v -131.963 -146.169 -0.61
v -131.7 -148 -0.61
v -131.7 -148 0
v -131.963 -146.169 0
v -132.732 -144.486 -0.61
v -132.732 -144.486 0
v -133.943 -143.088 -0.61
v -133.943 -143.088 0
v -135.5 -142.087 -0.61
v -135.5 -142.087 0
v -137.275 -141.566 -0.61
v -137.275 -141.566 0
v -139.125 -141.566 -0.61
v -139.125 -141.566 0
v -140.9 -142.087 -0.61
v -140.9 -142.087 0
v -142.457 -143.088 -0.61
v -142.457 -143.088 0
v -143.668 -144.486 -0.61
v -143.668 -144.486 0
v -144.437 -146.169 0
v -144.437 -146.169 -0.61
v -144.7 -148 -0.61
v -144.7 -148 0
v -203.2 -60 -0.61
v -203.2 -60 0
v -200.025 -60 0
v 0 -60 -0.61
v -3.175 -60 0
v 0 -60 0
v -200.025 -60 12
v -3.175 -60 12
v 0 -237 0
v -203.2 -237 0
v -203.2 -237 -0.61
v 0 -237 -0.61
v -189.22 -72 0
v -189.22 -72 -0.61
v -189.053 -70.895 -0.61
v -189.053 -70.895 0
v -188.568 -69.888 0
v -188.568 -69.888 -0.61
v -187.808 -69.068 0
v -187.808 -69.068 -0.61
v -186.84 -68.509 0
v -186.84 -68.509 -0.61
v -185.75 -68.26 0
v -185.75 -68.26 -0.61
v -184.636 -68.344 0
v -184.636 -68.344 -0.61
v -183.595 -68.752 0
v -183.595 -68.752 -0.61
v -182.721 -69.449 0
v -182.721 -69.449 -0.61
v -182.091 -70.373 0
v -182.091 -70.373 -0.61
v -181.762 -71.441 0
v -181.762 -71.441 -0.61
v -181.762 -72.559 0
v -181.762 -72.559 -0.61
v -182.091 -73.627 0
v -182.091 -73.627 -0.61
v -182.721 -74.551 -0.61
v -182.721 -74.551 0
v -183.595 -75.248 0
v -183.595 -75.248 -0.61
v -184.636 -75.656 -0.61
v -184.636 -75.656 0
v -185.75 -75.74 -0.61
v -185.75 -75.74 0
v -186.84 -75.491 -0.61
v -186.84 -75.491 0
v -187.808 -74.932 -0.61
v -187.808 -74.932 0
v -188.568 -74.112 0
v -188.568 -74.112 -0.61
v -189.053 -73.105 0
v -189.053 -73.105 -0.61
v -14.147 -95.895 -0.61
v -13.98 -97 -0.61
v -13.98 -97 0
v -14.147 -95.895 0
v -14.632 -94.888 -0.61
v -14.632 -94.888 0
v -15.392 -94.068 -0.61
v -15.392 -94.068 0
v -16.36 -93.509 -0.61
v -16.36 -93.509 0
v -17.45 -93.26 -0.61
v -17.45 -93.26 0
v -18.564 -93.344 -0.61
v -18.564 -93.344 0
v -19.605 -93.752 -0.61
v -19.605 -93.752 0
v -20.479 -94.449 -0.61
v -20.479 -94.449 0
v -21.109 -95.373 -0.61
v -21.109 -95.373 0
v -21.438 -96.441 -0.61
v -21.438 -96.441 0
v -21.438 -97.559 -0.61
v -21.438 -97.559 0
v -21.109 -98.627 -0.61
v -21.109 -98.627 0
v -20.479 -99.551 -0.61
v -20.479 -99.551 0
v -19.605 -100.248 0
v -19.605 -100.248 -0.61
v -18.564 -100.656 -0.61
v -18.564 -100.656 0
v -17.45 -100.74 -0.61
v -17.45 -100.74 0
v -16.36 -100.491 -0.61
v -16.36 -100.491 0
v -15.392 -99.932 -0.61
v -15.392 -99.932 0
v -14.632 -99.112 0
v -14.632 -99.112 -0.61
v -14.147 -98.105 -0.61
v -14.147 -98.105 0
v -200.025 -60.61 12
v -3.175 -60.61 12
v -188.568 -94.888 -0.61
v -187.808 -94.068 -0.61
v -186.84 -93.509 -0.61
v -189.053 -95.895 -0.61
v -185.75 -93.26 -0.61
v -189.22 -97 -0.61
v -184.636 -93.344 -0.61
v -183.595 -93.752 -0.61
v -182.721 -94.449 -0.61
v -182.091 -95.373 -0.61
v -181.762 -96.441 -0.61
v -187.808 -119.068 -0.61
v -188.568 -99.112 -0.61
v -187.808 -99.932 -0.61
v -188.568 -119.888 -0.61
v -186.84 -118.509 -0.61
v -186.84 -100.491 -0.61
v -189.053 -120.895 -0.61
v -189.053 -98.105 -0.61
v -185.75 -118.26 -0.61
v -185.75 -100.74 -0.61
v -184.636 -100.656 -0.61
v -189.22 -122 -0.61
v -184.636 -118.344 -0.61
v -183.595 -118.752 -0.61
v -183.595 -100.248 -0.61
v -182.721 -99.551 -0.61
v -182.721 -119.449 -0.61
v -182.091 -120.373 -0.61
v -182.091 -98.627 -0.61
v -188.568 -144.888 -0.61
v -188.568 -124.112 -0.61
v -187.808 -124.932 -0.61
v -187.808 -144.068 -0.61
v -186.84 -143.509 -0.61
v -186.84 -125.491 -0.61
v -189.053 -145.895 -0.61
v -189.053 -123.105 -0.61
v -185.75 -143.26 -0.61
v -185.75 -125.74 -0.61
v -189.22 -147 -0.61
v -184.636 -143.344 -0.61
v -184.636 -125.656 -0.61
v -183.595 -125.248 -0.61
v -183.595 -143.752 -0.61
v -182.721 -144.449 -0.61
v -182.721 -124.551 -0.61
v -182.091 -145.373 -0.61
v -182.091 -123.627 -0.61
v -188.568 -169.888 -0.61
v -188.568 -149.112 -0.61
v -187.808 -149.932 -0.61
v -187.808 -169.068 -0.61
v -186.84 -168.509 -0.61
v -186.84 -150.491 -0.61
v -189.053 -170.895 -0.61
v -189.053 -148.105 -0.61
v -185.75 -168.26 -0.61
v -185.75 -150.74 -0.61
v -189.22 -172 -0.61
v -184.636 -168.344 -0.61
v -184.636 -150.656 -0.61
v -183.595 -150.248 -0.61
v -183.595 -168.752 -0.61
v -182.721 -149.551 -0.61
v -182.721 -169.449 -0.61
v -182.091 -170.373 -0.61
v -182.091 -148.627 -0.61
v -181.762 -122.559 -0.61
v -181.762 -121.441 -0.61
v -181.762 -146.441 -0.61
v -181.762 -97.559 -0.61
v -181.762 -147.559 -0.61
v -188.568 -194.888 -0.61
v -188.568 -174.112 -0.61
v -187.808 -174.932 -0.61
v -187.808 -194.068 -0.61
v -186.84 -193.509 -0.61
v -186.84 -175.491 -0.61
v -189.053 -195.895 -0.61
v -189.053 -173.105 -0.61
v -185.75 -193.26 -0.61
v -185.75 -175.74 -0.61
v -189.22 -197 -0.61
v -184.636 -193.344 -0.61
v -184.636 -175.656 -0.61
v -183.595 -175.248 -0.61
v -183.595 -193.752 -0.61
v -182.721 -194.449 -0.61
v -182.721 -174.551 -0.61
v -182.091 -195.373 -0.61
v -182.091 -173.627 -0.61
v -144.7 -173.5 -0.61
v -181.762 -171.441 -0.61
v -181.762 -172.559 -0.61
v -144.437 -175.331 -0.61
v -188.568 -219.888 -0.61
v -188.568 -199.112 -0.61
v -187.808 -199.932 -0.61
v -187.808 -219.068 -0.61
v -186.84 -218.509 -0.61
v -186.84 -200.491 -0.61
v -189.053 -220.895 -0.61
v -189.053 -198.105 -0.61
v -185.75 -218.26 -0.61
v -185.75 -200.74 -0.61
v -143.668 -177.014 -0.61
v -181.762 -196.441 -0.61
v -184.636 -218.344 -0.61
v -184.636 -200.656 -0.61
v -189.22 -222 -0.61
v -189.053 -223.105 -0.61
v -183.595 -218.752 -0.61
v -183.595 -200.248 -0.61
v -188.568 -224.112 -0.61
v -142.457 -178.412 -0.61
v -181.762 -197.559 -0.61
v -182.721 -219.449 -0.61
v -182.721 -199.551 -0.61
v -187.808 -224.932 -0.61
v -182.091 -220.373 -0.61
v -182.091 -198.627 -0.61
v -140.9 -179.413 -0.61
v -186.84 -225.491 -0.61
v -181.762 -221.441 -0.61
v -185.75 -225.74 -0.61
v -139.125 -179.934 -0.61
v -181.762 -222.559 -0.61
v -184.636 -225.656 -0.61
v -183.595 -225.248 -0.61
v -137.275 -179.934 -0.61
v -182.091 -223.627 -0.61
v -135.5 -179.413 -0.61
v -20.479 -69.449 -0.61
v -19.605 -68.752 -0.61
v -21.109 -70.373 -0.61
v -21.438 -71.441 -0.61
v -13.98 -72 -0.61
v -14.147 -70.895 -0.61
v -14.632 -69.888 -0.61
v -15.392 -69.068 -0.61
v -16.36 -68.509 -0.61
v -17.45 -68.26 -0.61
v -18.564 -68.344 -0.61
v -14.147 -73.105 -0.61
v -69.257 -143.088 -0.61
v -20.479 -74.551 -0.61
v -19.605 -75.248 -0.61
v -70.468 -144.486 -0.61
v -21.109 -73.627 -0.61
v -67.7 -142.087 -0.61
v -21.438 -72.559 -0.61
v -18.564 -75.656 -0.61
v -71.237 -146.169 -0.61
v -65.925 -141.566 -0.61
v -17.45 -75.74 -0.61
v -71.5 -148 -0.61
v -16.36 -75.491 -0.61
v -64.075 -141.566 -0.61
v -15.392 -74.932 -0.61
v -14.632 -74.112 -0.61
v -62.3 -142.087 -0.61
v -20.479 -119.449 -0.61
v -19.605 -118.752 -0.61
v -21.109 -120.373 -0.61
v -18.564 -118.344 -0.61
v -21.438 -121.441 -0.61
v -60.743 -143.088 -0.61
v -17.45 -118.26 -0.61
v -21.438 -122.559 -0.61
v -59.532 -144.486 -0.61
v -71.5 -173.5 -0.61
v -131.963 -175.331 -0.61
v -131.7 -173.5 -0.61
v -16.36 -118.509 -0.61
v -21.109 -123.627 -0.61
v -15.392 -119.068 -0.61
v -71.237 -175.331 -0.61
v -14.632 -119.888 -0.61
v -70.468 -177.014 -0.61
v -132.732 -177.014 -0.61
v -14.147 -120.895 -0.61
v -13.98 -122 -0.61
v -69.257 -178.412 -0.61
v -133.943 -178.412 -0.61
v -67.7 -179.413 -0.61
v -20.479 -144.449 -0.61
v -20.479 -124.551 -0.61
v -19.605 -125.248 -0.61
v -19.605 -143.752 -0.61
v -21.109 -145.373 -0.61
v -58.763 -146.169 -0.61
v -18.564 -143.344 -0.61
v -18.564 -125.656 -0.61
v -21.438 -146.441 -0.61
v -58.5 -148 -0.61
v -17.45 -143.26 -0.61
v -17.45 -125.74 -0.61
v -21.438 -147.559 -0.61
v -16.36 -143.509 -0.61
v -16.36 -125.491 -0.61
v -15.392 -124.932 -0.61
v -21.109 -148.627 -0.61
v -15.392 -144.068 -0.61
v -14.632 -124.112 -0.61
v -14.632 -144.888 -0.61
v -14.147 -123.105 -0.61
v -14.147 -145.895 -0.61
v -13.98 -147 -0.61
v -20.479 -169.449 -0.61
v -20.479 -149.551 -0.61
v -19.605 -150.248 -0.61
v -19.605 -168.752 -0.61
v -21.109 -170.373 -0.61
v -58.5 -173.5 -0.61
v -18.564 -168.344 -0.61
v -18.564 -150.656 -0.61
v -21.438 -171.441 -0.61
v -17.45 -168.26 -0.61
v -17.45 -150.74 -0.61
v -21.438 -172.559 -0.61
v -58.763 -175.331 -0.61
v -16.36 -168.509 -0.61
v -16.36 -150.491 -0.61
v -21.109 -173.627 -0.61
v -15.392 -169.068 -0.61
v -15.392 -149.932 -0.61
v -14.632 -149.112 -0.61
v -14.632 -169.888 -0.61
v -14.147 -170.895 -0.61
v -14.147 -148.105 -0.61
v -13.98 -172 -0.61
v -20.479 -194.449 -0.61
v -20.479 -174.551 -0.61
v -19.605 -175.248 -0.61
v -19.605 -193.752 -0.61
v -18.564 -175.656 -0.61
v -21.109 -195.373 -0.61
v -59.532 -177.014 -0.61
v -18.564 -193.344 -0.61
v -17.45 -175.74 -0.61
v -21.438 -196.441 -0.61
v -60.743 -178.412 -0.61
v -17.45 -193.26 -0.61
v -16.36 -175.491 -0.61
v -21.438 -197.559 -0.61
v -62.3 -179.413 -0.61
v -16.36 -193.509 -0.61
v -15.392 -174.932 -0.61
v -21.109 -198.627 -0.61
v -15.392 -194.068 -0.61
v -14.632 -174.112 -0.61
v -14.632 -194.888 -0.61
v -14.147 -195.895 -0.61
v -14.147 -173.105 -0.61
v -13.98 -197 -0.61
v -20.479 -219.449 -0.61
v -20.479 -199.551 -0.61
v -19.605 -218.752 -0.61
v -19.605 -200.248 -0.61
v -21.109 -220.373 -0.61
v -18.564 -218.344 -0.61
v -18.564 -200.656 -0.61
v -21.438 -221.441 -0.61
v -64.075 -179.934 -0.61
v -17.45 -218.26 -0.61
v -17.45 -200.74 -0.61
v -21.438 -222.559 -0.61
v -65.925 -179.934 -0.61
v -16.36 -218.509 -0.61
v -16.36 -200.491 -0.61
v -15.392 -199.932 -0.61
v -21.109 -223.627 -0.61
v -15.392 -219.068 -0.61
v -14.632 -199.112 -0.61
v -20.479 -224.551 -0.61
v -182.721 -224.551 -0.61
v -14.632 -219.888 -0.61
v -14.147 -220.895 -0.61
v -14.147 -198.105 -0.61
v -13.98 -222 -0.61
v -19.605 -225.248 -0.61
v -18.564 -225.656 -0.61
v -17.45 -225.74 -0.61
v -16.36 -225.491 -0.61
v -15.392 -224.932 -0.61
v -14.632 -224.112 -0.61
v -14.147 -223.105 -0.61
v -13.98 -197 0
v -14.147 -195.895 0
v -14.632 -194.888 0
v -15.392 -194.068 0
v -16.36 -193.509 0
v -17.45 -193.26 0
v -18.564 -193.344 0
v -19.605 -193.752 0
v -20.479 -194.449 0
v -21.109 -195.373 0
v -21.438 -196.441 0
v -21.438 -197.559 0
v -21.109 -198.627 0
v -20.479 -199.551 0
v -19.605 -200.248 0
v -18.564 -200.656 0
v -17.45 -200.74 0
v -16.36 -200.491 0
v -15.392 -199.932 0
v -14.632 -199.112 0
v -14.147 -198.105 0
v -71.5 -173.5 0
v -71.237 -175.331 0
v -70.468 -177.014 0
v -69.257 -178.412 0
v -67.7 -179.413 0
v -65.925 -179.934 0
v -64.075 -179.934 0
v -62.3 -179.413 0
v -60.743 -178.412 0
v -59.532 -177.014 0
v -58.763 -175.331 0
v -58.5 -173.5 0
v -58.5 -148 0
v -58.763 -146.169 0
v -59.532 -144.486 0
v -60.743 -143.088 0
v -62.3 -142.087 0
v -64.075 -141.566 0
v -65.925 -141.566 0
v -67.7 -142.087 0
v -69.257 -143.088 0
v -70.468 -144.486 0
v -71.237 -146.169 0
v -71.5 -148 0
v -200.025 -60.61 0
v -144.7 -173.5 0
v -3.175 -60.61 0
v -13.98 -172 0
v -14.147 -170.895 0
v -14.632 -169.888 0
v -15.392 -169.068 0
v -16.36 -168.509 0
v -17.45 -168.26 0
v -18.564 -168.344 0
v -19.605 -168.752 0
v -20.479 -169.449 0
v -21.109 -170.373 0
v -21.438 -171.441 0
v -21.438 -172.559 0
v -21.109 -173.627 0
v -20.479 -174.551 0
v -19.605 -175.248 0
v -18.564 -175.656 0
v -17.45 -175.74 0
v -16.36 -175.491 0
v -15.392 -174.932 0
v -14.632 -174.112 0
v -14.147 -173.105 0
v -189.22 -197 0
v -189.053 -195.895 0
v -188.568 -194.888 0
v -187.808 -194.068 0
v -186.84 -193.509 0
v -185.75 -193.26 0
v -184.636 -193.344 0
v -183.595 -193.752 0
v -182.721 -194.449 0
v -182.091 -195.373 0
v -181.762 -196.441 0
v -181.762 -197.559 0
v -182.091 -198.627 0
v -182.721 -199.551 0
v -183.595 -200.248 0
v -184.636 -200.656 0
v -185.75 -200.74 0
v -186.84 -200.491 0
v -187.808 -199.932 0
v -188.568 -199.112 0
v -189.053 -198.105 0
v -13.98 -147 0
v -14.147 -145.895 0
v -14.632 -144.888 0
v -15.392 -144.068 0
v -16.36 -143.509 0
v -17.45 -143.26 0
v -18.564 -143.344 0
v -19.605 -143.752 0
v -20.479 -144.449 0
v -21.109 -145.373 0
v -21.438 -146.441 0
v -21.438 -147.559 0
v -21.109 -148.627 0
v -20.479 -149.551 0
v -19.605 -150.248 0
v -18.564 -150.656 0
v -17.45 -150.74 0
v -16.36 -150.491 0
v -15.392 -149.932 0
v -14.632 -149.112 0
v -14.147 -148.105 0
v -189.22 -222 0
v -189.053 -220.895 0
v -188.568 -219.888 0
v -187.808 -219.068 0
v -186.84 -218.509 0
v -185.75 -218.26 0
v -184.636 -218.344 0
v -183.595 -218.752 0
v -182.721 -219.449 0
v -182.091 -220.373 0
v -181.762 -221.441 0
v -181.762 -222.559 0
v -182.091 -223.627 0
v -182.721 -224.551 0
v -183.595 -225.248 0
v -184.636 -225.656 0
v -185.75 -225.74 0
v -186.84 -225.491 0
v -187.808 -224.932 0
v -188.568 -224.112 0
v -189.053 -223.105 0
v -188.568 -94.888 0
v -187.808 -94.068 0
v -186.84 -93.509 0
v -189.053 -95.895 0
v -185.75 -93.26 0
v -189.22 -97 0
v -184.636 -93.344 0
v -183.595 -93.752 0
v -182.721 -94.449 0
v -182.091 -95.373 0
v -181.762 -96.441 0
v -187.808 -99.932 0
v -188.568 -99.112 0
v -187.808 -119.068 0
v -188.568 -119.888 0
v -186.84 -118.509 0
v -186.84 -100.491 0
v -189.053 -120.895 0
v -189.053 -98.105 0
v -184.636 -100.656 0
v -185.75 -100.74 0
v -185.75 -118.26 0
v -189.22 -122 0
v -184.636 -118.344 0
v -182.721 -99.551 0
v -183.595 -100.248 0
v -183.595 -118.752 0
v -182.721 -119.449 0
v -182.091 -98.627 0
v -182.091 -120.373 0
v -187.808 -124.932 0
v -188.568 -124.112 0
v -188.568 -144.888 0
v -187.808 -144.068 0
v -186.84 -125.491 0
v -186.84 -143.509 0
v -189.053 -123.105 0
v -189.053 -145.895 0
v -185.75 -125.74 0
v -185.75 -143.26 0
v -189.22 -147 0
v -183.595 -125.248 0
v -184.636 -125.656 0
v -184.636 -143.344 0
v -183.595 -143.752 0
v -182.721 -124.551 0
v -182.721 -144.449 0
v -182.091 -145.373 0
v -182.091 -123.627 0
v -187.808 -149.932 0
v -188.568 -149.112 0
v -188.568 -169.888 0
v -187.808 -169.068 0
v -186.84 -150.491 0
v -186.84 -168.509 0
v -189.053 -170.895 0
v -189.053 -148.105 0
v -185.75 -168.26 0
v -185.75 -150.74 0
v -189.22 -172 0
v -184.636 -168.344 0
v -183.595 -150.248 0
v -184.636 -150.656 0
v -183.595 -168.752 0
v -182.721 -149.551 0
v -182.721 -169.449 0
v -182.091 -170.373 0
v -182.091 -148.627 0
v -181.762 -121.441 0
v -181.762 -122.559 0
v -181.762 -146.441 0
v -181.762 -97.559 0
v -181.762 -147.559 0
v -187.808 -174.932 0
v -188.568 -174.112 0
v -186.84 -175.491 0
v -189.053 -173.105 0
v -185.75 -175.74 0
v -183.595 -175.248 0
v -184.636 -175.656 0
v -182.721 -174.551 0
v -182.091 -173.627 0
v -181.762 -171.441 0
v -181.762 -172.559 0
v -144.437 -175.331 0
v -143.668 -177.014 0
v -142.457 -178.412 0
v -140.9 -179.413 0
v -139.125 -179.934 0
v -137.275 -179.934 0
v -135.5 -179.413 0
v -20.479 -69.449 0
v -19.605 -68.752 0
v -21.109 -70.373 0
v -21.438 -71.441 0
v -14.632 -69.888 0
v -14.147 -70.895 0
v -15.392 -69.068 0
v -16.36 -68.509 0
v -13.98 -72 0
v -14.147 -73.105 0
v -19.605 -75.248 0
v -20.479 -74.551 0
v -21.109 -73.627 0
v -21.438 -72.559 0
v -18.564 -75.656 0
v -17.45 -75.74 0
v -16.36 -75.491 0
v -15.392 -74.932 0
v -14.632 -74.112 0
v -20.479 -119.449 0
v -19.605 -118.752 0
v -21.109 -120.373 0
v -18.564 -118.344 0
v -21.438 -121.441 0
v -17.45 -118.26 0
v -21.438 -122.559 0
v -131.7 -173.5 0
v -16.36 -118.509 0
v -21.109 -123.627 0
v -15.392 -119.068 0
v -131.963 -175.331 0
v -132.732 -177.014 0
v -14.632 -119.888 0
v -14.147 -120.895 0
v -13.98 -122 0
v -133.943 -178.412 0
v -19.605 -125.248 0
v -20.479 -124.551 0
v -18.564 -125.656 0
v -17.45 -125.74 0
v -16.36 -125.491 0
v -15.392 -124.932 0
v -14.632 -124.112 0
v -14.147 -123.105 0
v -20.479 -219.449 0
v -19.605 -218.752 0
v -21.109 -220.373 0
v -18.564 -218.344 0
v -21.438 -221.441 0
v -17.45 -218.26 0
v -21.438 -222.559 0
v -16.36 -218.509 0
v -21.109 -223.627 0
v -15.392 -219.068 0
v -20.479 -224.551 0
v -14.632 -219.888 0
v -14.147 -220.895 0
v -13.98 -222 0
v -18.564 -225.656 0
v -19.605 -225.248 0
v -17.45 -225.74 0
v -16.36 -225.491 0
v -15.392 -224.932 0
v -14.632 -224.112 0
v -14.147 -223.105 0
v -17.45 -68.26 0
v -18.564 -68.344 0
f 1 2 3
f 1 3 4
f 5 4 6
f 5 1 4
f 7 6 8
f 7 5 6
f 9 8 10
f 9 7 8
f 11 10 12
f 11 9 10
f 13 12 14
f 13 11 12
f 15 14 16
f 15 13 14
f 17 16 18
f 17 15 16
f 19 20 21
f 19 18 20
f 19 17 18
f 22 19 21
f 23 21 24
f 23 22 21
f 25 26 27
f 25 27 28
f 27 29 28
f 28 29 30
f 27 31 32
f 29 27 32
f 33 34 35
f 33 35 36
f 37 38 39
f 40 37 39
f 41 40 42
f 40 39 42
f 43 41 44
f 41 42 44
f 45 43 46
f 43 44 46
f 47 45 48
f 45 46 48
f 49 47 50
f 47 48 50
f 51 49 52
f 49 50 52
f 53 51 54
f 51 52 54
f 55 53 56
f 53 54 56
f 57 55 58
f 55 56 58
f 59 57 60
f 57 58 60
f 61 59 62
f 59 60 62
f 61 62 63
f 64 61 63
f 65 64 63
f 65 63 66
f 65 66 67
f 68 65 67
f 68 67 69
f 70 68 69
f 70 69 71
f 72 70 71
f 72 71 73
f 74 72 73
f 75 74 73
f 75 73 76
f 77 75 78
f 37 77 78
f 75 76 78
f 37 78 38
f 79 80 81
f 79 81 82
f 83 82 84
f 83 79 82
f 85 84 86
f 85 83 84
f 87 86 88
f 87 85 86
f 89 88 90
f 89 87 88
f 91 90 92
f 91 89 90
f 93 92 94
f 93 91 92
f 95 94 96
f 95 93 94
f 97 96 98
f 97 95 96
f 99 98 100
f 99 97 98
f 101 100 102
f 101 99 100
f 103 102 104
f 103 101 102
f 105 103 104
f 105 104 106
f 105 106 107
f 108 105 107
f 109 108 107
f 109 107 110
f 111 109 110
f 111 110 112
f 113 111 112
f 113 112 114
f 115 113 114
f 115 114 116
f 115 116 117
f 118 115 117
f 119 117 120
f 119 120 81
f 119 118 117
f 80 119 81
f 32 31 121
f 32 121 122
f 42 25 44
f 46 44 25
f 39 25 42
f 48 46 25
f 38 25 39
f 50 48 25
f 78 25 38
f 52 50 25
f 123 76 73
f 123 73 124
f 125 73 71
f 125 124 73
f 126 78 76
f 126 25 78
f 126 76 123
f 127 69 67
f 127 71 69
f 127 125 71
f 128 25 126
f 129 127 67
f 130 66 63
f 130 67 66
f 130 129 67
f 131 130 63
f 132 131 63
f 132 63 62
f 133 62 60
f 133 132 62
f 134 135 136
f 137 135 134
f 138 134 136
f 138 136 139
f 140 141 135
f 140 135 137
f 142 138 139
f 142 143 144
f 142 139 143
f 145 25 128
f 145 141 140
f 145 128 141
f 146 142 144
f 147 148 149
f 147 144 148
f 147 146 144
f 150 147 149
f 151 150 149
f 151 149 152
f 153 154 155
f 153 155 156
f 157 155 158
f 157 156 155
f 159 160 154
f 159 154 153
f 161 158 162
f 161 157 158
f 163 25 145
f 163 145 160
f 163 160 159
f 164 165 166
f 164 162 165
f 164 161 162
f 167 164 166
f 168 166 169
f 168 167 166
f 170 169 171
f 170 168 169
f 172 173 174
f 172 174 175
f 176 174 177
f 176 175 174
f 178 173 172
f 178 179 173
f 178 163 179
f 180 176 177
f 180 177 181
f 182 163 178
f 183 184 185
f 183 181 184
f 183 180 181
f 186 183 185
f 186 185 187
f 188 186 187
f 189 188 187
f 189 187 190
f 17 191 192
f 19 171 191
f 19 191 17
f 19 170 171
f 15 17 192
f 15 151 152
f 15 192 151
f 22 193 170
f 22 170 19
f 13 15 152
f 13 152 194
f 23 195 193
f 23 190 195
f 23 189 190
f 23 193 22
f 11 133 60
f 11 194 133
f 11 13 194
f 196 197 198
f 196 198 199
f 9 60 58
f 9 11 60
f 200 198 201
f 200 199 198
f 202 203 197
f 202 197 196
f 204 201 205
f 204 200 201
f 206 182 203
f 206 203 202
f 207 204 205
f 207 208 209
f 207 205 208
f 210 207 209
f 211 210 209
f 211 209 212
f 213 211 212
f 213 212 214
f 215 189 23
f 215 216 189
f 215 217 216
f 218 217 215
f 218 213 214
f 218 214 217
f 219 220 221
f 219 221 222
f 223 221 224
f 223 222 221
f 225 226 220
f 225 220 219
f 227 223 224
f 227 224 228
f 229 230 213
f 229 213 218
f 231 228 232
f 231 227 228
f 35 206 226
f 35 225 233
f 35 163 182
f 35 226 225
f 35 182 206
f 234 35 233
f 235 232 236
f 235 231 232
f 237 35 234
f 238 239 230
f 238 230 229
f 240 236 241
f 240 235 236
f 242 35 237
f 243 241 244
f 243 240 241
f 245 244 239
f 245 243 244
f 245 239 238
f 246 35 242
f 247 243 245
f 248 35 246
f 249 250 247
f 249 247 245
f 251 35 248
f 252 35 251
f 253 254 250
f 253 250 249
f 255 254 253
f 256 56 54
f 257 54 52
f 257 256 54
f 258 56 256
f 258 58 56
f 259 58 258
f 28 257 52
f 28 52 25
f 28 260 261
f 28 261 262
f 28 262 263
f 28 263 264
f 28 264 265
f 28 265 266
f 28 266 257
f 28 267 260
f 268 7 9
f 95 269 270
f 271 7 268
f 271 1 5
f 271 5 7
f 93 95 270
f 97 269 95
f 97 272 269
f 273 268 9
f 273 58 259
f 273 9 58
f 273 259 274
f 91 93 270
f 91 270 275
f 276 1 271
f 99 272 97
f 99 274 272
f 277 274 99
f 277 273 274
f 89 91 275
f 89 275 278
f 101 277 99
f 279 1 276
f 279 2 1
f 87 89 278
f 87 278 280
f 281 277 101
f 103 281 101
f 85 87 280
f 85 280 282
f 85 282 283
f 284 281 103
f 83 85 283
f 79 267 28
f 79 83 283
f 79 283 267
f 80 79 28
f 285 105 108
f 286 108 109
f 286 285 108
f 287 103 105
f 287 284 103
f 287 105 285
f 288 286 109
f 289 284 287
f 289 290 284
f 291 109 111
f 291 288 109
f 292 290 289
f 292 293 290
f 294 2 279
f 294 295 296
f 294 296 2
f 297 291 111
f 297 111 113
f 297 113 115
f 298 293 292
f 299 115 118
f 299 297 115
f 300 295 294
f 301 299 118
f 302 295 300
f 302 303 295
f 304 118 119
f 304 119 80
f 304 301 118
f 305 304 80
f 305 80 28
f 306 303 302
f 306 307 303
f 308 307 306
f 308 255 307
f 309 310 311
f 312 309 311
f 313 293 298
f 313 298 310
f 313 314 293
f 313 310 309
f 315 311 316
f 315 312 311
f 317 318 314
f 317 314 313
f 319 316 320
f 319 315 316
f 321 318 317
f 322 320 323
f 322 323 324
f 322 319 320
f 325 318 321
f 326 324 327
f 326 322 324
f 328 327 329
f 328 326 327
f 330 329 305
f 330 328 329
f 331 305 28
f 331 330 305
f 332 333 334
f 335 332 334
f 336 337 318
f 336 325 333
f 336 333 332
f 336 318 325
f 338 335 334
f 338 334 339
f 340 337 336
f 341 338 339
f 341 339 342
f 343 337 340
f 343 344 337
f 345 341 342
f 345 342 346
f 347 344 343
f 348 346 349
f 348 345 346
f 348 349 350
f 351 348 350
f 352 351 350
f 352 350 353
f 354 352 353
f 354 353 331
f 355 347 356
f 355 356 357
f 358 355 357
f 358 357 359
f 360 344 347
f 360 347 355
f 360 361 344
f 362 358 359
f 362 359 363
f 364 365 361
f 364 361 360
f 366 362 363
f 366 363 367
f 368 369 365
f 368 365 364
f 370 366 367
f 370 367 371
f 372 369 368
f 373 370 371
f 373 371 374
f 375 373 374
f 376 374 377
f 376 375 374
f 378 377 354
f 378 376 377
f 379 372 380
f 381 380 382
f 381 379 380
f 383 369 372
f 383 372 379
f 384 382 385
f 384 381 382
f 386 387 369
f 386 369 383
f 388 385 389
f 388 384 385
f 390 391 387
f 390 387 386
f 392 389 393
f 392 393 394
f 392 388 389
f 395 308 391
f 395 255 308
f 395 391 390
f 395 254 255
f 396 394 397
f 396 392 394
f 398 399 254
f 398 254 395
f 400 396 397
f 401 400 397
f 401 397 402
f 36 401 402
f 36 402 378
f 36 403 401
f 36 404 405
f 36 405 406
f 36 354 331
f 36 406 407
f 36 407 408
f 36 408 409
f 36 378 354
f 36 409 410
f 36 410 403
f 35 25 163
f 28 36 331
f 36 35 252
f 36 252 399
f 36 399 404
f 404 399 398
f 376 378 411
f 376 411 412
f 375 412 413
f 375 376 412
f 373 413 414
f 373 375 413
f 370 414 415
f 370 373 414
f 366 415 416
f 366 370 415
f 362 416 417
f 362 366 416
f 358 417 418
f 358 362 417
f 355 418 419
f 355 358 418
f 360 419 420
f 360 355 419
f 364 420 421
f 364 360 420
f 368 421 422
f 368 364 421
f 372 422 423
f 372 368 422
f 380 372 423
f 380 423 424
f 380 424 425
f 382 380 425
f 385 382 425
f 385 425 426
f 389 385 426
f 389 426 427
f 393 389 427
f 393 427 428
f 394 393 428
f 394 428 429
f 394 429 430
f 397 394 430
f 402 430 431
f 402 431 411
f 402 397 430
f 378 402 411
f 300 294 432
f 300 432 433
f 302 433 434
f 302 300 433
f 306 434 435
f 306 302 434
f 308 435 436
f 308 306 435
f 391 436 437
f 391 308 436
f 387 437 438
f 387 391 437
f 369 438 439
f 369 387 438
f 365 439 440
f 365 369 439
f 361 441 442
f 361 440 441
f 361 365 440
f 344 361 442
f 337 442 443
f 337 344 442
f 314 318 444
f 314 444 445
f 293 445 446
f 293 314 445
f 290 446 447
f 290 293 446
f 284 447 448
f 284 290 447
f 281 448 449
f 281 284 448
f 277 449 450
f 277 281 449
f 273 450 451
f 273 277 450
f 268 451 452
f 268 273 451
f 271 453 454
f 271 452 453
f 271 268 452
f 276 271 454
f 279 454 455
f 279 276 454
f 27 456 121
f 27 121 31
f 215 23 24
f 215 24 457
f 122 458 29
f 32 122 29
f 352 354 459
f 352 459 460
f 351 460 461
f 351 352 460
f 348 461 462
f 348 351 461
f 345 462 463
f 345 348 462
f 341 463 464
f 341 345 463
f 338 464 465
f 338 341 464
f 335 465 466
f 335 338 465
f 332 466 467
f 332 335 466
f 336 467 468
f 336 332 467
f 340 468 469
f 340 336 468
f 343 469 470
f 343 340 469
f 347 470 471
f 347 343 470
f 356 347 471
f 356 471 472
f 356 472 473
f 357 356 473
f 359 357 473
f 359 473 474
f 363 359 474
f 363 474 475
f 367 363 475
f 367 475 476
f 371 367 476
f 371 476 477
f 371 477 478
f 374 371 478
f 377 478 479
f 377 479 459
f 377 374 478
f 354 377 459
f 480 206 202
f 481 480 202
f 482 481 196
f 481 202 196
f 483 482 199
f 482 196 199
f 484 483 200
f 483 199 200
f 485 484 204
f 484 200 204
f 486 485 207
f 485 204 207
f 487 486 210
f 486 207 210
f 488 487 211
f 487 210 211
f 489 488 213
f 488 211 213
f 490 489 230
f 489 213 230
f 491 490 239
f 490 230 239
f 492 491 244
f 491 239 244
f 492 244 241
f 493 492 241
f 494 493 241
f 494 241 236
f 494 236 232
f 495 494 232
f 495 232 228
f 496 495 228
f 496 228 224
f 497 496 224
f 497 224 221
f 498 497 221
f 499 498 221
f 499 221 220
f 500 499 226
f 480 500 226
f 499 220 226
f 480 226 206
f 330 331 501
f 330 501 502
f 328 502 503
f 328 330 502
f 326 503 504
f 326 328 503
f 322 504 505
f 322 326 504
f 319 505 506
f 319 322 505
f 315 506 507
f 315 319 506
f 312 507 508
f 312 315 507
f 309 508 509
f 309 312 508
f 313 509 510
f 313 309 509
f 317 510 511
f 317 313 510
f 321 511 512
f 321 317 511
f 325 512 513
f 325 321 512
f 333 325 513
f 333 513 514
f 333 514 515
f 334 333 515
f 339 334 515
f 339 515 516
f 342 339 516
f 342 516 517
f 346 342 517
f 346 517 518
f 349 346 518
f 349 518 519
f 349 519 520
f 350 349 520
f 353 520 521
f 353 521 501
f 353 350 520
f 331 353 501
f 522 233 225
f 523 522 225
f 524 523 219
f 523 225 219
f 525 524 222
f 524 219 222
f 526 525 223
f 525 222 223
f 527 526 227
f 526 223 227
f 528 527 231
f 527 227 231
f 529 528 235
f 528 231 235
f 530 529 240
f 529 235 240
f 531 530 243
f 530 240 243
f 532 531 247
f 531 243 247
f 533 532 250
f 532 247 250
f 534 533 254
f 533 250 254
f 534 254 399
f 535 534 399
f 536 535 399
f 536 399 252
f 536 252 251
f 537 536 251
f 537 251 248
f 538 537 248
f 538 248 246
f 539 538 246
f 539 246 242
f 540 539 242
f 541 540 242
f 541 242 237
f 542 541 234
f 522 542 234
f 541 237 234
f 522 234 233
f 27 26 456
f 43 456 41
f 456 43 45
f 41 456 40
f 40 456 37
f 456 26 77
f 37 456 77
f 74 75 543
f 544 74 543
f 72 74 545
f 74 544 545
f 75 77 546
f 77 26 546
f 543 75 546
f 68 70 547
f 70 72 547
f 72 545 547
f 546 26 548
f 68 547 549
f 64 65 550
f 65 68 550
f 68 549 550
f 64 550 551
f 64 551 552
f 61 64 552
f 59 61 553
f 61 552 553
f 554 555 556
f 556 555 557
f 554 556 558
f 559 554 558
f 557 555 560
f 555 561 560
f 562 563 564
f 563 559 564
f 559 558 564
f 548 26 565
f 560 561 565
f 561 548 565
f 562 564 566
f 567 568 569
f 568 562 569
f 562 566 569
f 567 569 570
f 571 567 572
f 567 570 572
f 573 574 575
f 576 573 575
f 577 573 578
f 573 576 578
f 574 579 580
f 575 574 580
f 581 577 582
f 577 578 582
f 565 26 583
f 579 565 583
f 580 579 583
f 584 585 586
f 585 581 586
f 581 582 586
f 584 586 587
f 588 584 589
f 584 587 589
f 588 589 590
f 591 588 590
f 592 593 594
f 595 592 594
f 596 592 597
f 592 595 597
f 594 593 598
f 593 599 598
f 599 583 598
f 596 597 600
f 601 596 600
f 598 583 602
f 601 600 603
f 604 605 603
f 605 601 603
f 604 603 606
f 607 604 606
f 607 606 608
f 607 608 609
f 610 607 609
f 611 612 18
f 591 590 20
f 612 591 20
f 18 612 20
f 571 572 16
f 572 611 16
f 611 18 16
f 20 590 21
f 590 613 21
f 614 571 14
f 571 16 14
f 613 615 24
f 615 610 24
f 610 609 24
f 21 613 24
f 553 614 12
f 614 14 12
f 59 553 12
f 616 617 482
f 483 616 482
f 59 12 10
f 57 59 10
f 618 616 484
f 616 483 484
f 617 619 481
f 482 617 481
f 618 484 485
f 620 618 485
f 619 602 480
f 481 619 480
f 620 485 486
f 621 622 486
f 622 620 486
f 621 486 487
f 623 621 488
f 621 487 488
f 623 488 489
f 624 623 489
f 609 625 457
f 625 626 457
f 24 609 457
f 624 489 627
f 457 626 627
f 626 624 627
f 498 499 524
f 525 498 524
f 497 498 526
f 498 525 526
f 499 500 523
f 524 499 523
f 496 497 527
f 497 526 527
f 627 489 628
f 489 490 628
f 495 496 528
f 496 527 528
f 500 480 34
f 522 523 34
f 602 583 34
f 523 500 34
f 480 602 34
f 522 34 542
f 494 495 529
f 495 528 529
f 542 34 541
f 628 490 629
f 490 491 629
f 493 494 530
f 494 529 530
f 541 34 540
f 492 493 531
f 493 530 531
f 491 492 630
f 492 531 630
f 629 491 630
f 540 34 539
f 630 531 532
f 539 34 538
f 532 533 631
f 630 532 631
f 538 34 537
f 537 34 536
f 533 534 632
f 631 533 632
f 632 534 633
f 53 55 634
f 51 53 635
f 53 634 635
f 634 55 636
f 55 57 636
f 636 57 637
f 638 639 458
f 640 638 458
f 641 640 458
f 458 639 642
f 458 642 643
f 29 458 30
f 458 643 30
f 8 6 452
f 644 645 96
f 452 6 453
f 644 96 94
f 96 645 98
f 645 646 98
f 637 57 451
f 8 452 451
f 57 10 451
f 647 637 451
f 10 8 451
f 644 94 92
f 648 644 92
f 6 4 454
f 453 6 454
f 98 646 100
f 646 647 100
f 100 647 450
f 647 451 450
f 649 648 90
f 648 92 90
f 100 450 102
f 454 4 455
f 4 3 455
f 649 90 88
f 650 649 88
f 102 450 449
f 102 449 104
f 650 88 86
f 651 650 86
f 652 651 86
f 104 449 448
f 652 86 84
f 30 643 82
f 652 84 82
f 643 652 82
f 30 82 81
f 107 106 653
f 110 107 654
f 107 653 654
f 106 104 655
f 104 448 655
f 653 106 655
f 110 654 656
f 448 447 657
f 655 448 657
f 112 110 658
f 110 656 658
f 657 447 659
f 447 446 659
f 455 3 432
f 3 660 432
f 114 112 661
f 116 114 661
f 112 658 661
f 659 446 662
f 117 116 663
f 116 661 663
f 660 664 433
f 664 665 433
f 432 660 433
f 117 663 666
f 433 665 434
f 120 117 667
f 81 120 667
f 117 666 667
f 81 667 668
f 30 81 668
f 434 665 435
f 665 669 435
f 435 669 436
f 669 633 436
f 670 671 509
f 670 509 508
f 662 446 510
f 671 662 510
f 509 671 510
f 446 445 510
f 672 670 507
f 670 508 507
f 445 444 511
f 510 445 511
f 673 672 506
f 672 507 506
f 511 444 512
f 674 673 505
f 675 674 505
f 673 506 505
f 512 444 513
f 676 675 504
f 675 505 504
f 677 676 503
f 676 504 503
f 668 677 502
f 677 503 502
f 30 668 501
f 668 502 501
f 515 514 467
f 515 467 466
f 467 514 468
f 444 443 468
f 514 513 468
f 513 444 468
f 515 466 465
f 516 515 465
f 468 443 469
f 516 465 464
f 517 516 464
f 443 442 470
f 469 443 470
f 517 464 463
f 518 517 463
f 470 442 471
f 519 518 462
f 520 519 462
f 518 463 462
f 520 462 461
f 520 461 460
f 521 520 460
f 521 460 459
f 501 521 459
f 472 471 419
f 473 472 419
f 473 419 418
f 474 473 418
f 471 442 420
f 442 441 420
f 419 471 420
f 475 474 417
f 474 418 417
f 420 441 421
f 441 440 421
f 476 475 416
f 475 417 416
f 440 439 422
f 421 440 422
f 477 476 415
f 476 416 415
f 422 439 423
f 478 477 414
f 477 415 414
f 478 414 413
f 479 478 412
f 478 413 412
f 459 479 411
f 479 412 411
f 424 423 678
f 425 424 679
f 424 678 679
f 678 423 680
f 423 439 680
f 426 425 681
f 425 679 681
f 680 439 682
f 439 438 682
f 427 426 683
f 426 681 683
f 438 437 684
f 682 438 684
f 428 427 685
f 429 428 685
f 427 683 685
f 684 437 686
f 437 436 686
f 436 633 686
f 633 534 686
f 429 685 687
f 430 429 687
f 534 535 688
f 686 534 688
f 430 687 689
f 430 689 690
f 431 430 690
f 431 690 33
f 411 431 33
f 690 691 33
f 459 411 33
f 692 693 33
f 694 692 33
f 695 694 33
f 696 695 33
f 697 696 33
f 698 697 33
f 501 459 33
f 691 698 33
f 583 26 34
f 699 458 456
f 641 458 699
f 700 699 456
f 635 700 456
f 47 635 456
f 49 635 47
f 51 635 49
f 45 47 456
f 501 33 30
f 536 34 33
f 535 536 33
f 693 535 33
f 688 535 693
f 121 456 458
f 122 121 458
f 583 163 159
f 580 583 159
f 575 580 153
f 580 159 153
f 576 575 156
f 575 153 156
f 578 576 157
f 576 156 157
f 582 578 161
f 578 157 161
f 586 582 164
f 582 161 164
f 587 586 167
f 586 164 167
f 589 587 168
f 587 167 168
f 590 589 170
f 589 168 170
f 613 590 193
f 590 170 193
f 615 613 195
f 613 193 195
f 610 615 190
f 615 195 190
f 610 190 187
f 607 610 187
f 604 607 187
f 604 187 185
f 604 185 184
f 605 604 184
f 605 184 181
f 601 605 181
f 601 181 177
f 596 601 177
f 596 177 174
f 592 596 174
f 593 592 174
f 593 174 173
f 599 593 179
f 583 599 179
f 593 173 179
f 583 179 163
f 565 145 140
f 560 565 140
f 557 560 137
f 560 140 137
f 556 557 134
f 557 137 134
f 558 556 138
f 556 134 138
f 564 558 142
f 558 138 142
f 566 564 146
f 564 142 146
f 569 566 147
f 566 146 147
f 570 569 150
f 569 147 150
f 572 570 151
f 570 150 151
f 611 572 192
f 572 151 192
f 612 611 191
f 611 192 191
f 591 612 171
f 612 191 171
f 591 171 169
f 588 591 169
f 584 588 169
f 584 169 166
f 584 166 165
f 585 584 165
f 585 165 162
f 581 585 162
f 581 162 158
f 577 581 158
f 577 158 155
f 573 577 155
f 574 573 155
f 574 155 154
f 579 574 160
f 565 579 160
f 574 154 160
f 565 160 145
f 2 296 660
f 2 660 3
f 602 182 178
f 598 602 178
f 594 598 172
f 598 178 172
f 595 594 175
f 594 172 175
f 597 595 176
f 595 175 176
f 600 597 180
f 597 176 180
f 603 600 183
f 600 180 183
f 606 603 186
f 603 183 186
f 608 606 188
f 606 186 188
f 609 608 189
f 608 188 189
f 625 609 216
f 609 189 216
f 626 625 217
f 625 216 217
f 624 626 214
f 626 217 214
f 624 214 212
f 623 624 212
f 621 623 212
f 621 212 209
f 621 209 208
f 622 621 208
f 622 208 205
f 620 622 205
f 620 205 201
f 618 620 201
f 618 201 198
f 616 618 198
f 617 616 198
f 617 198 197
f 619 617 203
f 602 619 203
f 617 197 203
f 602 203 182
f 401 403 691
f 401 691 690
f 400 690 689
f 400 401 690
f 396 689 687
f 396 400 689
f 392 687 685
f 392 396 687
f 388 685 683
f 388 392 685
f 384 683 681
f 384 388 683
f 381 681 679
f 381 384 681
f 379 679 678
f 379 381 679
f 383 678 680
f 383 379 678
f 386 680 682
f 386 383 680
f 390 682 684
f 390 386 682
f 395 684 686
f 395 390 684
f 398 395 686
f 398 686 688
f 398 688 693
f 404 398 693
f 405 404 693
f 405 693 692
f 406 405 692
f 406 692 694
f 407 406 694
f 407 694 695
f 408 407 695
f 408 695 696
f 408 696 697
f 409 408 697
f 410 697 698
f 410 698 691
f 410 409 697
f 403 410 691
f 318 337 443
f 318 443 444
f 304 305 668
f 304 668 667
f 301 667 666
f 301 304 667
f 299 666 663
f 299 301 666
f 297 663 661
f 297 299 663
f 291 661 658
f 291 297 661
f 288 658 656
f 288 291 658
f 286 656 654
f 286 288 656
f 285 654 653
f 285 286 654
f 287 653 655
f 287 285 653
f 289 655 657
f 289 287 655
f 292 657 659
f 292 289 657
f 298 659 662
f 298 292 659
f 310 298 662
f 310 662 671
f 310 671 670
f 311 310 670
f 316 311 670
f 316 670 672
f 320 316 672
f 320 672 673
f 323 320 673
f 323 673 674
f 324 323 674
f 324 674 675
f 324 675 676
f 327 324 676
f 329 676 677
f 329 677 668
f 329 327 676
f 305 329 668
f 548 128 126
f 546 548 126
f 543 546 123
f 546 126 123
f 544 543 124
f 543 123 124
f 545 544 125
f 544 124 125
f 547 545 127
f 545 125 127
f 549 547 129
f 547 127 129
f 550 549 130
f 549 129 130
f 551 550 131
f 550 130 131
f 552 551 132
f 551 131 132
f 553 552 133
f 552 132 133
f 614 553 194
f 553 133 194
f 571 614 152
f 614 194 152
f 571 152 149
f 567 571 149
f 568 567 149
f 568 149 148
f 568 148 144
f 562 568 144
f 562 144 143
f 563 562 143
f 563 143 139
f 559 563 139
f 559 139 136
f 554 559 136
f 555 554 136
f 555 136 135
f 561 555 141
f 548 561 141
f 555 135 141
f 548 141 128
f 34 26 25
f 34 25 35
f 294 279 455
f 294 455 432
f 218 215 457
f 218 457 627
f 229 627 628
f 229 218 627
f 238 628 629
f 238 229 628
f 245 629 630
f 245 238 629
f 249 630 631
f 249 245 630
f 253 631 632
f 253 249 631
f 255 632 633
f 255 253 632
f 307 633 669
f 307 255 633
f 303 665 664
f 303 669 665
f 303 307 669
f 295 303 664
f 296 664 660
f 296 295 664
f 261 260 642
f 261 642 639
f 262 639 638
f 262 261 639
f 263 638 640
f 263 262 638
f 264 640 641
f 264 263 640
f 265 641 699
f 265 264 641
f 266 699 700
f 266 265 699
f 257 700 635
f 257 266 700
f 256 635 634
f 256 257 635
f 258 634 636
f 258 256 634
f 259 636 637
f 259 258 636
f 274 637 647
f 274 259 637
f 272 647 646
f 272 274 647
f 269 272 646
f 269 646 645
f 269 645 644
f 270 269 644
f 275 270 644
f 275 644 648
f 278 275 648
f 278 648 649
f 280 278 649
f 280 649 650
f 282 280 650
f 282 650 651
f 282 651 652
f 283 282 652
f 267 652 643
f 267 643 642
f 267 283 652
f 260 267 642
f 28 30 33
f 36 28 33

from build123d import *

# Parameters (mm, degrees)
SKETCH1_W           = 203.2
SKETCH1_H           = 177
BOSS_EXTRUDE1_DEPTH = 0.6096
CUT_EXTRUDE7_DEPTH  = 313.185220041
SKETCH4_W           = 196.85
SKETCH4_H           = 0.6096
BOSS_EXTRUDE2_DEPTH = 12
SKETCH8_R           = 3.75
CUT_EXTRUDE8_DEPTH  = 0.6096


with BuildPart() as part:
    # Sketch1 → Boss-Extrude1 (new body)
    with BuildSketch(Plane(origin=(0, 0, 0), x_dir=(1, 0, 0), z_dir=(0, 0, -1))):
        with Locations((-101.6, 148.5)):
            Rectangle(SKETCH1_W, SKETCH1_H)
    extrude(amount=BOSS_EXTRUDE1_DEPTH)

    # Sketch2 → Cut-Extrude7 (cut, through all)
    with BuildSketch(Plane(origin=(0, 0, -0.6096), x_dir=(1, 0, 0), z_dir=(0, 0, -1))):
        with BuildLine():
            Line((-131.7, 173.5), (-131.7, 148))
            ThreePointArc((-131.7, 148), (-138.2, 141.5), (-144.7, 148))
            Line((-144.7, 148), (-144.7, 173.5))
            ThreePointArc((-144.7, 173.5), (-138.2, 180), (-131.7, 173.5))
        make_face()
        with BuildLine():
            Line((-58.5, 173.5), (-58.5, 148))
            ThreePointArc((-58.5, 148), (-65, 141.5), (-71.5, 148))
            Line((-71.5, 148), (-71.5, 173.5))
            ThreePointArc((-71.5, 173.5), (-65, 180), (-58.5, 173.5))
        make_face()
    extrude(amount=-CUT_EXTRUDE7_DEPTH, mode=Mode.SUBTRACT)

    # Sketch4 → Boss-Extrude2 (add)
    with BuildSketch(Plane.XY):
        with Locations((-101.6, -60.3048)):
            Rectangle(SKETCH4_W, SKETCH4_H)
    extrude(amount=BOSS_EXTRUDE2_DEPTH)

    # Sketch8 → Cut-Extrude8 (cut)
    with BuildSketch(Plane(origin=(0, 0, -0.6096), x_dir=(-1, 0, 0), z_dir=(0, 0, -1))):
        with Locations((185.47, -222)):
            Circle(SKETCH8_R)
        with Locations((185.47, -197)):
            Circle(SKETCH8_R)
        with Locations((185.47, -172)):
            Circle(SKETCH8_R)
        with Locations((185.47, -147)):
            Circle(SKETCH8_R)
        with Locations((185.47, -122)):
            Circle(SKETCH8_R)
        with Locations((185.47, -97)):
            Circle(SKETCH8_R)
        with Locations((185.47, -72)):
            Circle(SKETCH8_R)
    cut_extrude8 = extrude(amount=-CUT_EXTRUDE8_DEPTH, mode=Mode.SUBTRACT)

    # Mirror1: Cut-Extrude8 across plane
    add(cut_extrude8.mirror(Plane(origin=(-101.6, 0, 0), x_dir=(0, 0, 1), z_dir=(1, 0, 0))), mode=Mode.SUBTRACT)


solid = part.part
